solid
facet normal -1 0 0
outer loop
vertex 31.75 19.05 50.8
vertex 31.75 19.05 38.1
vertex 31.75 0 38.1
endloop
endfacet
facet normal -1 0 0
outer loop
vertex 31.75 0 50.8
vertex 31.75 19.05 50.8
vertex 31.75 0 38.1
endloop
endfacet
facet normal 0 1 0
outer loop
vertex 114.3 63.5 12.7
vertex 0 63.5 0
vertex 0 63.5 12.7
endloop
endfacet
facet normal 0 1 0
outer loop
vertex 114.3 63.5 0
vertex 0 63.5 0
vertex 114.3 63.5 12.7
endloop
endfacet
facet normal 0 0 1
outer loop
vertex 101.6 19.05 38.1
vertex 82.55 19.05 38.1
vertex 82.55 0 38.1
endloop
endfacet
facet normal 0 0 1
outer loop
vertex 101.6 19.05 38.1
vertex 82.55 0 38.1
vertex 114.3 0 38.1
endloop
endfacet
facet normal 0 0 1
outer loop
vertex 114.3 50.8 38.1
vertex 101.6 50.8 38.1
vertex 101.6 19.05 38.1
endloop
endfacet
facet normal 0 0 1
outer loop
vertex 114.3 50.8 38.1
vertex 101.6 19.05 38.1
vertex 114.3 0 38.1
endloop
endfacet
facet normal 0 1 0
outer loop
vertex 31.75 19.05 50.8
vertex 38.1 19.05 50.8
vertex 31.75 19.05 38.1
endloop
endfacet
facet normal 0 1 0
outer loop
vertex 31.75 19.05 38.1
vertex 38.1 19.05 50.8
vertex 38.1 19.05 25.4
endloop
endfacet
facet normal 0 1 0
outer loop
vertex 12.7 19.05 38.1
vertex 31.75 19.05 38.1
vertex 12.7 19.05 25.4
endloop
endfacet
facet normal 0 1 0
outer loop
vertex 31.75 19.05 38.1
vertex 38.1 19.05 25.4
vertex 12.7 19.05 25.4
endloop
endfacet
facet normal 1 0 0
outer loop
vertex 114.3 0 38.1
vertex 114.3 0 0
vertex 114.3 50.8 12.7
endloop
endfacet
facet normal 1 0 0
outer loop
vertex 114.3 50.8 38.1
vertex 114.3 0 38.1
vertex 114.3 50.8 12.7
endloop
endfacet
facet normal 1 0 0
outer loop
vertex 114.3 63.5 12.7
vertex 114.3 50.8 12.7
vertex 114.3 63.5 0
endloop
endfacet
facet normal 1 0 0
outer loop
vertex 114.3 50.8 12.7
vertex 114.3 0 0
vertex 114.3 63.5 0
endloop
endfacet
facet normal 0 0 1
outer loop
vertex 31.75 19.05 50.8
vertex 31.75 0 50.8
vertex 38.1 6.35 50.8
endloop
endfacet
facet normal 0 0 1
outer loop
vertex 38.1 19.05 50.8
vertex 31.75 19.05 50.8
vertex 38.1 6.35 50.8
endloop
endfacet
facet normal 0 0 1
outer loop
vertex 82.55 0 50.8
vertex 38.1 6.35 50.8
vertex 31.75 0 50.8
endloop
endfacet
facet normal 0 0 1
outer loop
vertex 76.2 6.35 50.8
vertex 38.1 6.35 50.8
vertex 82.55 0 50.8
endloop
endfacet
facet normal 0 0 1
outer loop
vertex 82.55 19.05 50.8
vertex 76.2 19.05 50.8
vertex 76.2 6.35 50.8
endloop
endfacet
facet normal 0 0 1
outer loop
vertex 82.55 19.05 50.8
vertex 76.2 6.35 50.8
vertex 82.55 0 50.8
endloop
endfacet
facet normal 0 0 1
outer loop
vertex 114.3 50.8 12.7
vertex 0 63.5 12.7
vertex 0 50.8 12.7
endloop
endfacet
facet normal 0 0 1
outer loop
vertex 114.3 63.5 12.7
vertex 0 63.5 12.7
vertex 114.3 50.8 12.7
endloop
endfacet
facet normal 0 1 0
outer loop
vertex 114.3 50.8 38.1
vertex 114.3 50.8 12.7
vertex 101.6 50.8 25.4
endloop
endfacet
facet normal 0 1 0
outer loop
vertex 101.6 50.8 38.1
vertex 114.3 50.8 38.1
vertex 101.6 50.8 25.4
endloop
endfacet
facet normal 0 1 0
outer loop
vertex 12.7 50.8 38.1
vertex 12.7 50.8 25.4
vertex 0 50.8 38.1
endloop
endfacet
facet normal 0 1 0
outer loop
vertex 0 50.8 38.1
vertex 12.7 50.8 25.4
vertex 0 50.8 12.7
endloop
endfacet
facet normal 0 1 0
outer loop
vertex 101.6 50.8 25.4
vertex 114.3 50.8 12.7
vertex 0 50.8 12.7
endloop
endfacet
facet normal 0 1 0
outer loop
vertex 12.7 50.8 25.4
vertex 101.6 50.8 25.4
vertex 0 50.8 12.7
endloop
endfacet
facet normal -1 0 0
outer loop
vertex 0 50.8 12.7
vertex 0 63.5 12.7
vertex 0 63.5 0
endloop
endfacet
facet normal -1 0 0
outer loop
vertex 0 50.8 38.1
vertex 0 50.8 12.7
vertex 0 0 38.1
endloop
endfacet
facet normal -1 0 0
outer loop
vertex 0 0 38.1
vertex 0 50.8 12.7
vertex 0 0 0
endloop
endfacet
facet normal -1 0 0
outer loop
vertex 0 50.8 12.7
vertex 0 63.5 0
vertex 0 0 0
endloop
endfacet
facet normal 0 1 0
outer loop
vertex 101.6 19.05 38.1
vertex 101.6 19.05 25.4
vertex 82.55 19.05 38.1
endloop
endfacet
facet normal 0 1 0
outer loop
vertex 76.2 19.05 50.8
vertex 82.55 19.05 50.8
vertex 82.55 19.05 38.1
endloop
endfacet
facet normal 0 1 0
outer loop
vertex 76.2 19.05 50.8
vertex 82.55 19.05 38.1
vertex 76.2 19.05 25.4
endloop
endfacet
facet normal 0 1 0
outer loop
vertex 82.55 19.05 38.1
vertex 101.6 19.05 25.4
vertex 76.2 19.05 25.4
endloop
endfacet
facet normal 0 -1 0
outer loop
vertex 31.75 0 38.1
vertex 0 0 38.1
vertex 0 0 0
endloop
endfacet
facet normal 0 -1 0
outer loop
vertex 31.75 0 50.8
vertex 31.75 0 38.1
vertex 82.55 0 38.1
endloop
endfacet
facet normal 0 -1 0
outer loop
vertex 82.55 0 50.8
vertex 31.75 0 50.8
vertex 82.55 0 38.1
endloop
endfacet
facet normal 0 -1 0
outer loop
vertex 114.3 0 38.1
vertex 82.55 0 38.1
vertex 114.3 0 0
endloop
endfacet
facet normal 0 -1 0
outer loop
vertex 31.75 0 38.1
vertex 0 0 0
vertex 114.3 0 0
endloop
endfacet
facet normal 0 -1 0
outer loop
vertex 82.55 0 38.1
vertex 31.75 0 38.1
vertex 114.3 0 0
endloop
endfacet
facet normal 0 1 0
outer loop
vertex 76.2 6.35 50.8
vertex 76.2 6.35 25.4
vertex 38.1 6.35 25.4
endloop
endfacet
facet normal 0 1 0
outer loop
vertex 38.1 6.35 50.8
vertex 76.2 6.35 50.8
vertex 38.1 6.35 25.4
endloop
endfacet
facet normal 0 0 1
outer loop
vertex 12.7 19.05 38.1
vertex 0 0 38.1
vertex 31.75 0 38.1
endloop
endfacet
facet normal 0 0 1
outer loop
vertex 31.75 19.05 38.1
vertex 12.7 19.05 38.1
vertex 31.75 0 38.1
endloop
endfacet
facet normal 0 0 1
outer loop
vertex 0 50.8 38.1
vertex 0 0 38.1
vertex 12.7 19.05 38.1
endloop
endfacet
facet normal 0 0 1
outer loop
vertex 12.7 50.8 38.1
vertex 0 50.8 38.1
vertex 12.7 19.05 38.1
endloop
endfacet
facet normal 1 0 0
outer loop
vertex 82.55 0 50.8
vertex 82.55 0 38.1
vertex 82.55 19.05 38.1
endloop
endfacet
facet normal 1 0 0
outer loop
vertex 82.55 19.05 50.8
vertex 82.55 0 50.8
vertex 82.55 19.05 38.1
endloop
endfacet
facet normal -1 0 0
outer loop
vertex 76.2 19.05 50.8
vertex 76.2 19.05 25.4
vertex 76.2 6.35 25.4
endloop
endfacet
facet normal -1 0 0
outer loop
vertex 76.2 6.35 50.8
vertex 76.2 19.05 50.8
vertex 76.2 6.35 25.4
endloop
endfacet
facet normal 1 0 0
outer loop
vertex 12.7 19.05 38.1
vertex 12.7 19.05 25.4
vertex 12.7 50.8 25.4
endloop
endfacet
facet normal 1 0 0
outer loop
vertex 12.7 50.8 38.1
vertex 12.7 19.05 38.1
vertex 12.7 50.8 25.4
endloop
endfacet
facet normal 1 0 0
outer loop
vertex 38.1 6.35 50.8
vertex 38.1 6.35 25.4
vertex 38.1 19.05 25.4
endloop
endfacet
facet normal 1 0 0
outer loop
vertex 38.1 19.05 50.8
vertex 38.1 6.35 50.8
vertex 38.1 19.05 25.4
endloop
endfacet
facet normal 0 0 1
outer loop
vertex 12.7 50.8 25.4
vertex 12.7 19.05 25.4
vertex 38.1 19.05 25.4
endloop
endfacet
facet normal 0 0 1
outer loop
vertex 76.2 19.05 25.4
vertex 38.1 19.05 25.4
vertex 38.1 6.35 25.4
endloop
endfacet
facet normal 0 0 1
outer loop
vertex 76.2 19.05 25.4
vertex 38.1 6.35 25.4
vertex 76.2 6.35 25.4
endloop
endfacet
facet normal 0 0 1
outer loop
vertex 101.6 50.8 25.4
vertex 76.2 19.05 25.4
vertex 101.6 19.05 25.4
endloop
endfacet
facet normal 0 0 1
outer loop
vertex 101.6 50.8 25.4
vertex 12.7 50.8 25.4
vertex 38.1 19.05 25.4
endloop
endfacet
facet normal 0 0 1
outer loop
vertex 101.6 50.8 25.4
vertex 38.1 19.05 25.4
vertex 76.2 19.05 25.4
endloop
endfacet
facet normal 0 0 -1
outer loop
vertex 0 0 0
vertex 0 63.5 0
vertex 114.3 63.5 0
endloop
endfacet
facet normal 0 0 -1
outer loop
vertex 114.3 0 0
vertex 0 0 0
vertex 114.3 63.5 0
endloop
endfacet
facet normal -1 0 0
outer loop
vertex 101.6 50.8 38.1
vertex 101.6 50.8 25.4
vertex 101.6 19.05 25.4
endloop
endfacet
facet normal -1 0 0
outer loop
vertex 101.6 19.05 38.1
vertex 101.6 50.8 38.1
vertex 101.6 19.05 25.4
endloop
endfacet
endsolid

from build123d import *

# Parameters (mm, degrees)
F0_W     = 114.3
F0_H     = 63.5
F1_DEPTH = 12.7
F4_DEPTH = 12.7
F5_DEPTH = 25.4
F6_DEPTH = 38.1


with BuildPart() as f1:
    # F0 (on Top) → F1 (new body)
    with BuildSketch(Plane.XY):
        with Locations((57.15, 31.75)):
            Rectangle(F0_W, F0_H)
    extrude(amount=F1_DEPTH)

    # F3 (on offset) → F4 (join)
    with BuildSketch(Plane.XY.offset(12.7)):
        Polygon((12.7, 19.05), (31.75, 19.05), (38.1, 19.05), (38.1, 6.35), (76.2, 6.35), (76.2, 19.05), (82.55, 19.05), (101.6, 19.05), (101.6, 50.8), (12.7, 50.8), align=None)
    extrude(amount=F4_DEPTH)

    # F3 (on offset) → F5 (join)
    with BuildSketch(Plane.XY.offset(12.7)):
        Polygon((0, 50.8), (0, 0), (31.75, 0), (31.75, 19.05), (12.7, 19.05), (12.7, 50.8), align=None)
        Polygon((82.55, 19.05), (82.55, 0), (114.3, 0), (114.3, 50.8), (101.6, 50.8), (101.6, 19.05), align=None)
    extrude(amount=F5_DEPTH)

    # F3 (on offset) → F6 (join)
    with BuildSketch(Plane.XY.offset(12.7)):
        Polygon((31.75, 19.05), (31.75, 0), (82.55, 0), (82.55, 19.05), (76.2, 19.05), (76.2, 6.35), (38.1, 6.35), (38.1, 19.05), align=None)
    extrude(amount=F6_DEPTH)


solid = f1.part
